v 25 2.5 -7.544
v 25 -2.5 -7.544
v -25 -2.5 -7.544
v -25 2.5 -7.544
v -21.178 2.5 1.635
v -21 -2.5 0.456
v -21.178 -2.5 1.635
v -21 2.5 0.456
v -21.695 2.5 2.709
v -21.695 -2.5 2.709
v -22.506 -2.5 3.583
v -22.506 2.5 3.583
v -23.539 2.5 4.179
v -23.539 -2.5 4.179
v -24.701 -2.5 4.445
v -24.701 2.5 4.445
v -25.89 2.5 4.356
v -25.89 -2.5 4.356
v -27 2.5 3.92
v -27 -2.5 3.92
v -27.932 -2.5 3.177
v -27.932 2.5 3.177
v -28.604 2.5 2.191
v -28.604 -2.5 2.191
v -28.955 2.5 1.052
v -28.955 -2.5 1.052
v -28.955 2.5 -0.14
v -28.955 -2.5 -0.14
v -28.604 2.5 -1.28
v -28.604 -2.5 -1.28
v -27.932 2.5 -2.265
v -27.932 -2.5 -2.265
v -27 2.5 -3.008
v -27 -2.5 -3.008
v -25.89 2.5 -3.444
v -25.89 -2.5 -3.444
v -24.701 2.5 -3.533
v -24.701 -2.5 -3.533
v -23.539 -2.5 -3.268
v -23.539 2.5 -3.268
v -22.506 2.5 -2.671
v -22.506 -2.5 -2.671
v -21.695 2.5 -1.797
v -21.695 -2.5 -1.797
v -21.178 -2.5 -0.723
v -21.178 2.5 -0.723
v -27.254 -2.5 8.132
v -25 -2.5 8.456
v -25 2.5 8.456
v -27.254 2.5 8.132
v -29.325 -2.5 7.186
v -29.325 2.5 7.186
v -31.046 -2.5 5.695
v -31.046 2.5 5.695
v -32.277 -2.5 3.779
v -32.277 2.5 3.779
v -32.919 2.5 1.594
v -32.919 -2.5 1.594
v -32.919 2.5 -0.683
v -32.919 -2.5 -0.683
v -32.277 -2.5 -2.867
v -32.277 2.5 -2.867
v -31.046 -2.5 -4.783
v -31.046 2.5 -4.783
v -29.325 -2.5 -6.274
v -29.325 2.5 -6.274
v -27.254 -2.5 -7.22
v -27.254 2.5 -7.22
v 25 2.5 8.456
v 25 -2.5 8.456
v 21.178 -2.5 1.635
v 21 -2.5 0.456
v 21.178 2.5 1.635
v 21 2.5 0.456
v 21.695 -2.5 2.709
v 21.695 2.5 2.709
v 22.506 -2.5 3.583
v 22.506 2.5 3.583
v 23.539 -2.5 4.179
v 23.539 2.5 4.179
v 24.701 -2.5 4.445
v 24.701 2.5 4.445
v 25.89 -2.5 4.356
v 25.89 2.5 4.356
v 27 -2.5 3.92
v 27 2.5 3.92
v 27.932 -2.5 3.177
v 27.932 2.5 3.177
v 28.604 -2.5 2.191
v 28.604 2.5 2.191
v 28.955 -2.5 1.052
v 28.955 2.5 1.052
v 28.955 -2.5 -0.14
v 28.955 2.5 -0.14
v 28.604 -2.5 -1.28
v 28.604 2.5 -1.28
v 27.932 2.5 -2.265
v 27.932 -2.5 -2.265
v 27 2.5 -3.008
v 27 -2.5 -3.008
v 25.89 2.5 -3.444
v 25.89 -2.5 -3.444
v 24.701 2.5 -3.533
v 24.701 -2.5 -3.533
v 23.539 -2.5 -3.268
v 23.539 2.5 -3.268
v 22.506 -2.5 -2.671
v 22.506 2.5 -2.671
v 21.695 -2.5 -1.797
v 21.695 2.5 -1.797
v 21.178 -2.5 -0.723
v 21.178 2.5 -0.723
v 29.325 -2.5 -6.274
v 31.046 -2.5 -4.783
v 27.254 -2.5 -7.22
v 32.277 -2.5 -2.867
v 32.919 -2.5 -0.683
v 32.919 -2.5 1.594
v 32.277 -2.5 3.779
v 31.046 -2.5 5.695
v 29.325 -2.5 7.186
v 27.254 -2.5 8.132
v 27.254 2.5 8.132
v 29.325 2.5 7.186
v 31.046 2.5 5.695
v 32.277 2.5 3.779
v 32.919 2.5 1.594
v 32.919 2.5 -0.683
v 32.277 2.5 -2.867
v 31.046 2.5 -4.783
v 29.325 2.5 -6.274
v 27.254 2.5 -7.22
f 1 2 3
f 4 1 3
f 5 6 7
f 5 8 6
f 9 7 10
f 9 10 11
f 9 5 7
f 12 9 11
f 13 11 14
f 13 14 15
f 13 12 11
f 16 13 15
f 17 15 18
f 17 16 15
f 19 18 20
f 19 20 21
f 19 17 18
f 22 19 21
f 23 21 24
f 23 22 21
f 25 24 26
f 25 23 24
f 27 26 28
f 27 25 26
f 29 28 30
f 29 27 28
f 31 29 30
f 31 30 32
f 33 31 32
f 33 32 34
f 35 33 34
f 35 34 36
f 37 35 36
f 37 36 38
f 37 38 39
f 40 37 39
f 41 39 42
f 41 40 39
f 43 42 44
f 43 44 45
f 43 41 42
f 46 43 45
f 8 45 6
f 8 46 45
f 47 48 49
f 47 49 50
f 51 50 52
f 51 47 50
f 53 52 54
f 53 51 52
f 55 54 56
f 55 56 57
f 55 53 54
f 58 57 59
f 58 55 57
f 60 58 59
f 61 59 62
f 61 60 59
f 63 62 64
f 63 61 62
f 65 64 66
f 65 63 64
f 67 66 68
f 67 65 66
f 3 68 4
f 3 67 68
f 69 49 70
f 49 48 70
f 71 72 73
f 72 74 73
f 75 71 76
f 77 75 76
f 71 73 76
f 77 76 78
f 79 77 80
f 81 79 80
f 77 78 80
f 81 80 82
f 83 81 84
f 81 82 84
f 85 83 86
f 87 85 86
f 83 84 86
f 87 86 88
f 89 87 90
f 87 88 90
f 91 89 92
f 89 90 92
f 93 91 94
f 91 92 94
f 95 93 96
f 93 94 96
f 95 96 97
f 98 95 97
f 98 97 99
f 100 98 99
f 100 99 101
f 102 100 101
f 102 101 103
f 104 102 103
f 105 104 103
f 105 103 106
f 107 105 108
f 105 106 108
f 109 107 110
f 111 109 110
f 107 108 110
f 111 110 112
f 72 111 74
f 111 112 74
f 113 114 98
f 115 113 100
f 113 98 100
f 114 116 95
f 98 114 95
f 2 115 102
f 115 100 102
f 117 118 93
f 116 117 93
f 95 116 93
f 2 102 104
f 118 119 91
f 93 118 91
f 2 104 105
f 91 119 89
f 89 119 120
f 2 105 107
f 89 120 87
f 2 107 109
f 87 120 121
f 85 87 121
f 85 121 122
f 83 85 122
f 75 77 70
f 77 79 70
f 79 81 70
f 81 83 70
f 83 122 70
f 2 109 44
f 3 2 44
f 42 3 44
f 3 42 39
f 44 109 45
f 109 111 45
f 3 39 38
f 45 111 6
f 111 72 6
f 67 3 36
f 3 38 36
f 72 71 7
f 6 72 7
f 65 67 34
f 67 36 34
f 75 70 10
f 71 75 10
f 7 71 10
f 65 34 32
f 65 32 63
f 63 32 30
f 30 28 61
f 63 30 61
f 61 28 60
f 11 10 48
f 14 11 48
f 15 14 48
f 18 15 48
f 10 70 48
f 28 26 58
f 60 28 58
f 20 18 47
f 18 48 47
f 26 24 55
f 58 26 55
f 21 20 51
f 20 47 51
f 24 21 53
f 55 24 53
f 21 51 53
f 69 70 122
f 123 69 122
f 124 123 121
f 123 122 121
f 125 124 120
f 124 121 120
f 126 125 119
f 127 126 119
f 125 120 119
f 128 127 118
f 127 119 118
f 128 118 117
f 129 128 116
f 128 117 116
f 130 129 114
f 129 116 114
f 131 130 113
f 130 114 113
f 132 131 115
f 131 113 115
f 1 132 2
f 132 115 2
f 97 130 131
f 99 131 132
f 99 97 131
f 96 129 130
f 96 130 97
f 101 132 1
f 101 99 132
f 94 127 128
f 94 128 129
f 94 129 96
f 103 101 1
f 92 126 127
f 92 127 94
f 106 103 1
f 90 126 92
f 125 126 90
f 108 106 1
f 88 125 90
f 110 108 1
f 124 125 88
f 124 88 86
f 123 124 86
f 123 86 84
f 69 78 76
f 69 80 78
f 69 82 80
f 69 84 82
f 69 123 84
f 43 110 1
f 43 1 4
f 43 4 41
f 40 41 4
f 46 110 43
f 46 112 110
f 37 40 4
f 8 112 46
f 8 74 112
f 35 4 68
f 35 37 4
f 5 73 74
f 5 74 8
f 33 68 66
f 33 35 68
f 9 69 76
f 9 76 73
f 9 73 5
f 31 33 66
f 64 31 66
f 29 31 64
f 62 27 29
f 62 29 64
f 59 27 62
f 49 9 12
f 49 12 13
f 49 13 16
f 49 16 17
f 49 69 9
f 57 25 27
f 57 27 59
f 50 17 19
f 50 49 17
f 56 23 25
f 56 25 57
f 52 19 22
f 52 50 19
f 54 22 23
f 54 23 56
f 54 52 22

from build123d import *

# Parameters (mm, degrees)
F0_R     = 4
F1_DEPTH = 2.5


with BuildPart() as f1:
    # F0 (on Front) → F1 (new body, symmetric)
    with BuildSketch(Plane.XZ):
        with BuildLine():
            Line((0, 8.455922), (-25, 8.455922))
            ThreePointArc((-25, 8.455922), (-33, 0.455922), (-25, -7.544078))
            Line((-25, -7.544078), (0, -7.544078))
            Line((0, -7.544078), (0, 8.455922))
        make_face()
        with Locations((-25, 0.455922)):
            Circle(F0_R, mode=Mode.SUBTRACT)
    extrude(amount=F1_DEPTH, both=True)

    # F2: F1 across face


with BuildPart() as f1_1:
    add(f1.part)
    add(f1.part.mirror(Plane(origin=(0, 0, 0.455922), x_dir=(0, 1, 0), z_dir=(1, 0, 0))))


solid = f1_1.part
